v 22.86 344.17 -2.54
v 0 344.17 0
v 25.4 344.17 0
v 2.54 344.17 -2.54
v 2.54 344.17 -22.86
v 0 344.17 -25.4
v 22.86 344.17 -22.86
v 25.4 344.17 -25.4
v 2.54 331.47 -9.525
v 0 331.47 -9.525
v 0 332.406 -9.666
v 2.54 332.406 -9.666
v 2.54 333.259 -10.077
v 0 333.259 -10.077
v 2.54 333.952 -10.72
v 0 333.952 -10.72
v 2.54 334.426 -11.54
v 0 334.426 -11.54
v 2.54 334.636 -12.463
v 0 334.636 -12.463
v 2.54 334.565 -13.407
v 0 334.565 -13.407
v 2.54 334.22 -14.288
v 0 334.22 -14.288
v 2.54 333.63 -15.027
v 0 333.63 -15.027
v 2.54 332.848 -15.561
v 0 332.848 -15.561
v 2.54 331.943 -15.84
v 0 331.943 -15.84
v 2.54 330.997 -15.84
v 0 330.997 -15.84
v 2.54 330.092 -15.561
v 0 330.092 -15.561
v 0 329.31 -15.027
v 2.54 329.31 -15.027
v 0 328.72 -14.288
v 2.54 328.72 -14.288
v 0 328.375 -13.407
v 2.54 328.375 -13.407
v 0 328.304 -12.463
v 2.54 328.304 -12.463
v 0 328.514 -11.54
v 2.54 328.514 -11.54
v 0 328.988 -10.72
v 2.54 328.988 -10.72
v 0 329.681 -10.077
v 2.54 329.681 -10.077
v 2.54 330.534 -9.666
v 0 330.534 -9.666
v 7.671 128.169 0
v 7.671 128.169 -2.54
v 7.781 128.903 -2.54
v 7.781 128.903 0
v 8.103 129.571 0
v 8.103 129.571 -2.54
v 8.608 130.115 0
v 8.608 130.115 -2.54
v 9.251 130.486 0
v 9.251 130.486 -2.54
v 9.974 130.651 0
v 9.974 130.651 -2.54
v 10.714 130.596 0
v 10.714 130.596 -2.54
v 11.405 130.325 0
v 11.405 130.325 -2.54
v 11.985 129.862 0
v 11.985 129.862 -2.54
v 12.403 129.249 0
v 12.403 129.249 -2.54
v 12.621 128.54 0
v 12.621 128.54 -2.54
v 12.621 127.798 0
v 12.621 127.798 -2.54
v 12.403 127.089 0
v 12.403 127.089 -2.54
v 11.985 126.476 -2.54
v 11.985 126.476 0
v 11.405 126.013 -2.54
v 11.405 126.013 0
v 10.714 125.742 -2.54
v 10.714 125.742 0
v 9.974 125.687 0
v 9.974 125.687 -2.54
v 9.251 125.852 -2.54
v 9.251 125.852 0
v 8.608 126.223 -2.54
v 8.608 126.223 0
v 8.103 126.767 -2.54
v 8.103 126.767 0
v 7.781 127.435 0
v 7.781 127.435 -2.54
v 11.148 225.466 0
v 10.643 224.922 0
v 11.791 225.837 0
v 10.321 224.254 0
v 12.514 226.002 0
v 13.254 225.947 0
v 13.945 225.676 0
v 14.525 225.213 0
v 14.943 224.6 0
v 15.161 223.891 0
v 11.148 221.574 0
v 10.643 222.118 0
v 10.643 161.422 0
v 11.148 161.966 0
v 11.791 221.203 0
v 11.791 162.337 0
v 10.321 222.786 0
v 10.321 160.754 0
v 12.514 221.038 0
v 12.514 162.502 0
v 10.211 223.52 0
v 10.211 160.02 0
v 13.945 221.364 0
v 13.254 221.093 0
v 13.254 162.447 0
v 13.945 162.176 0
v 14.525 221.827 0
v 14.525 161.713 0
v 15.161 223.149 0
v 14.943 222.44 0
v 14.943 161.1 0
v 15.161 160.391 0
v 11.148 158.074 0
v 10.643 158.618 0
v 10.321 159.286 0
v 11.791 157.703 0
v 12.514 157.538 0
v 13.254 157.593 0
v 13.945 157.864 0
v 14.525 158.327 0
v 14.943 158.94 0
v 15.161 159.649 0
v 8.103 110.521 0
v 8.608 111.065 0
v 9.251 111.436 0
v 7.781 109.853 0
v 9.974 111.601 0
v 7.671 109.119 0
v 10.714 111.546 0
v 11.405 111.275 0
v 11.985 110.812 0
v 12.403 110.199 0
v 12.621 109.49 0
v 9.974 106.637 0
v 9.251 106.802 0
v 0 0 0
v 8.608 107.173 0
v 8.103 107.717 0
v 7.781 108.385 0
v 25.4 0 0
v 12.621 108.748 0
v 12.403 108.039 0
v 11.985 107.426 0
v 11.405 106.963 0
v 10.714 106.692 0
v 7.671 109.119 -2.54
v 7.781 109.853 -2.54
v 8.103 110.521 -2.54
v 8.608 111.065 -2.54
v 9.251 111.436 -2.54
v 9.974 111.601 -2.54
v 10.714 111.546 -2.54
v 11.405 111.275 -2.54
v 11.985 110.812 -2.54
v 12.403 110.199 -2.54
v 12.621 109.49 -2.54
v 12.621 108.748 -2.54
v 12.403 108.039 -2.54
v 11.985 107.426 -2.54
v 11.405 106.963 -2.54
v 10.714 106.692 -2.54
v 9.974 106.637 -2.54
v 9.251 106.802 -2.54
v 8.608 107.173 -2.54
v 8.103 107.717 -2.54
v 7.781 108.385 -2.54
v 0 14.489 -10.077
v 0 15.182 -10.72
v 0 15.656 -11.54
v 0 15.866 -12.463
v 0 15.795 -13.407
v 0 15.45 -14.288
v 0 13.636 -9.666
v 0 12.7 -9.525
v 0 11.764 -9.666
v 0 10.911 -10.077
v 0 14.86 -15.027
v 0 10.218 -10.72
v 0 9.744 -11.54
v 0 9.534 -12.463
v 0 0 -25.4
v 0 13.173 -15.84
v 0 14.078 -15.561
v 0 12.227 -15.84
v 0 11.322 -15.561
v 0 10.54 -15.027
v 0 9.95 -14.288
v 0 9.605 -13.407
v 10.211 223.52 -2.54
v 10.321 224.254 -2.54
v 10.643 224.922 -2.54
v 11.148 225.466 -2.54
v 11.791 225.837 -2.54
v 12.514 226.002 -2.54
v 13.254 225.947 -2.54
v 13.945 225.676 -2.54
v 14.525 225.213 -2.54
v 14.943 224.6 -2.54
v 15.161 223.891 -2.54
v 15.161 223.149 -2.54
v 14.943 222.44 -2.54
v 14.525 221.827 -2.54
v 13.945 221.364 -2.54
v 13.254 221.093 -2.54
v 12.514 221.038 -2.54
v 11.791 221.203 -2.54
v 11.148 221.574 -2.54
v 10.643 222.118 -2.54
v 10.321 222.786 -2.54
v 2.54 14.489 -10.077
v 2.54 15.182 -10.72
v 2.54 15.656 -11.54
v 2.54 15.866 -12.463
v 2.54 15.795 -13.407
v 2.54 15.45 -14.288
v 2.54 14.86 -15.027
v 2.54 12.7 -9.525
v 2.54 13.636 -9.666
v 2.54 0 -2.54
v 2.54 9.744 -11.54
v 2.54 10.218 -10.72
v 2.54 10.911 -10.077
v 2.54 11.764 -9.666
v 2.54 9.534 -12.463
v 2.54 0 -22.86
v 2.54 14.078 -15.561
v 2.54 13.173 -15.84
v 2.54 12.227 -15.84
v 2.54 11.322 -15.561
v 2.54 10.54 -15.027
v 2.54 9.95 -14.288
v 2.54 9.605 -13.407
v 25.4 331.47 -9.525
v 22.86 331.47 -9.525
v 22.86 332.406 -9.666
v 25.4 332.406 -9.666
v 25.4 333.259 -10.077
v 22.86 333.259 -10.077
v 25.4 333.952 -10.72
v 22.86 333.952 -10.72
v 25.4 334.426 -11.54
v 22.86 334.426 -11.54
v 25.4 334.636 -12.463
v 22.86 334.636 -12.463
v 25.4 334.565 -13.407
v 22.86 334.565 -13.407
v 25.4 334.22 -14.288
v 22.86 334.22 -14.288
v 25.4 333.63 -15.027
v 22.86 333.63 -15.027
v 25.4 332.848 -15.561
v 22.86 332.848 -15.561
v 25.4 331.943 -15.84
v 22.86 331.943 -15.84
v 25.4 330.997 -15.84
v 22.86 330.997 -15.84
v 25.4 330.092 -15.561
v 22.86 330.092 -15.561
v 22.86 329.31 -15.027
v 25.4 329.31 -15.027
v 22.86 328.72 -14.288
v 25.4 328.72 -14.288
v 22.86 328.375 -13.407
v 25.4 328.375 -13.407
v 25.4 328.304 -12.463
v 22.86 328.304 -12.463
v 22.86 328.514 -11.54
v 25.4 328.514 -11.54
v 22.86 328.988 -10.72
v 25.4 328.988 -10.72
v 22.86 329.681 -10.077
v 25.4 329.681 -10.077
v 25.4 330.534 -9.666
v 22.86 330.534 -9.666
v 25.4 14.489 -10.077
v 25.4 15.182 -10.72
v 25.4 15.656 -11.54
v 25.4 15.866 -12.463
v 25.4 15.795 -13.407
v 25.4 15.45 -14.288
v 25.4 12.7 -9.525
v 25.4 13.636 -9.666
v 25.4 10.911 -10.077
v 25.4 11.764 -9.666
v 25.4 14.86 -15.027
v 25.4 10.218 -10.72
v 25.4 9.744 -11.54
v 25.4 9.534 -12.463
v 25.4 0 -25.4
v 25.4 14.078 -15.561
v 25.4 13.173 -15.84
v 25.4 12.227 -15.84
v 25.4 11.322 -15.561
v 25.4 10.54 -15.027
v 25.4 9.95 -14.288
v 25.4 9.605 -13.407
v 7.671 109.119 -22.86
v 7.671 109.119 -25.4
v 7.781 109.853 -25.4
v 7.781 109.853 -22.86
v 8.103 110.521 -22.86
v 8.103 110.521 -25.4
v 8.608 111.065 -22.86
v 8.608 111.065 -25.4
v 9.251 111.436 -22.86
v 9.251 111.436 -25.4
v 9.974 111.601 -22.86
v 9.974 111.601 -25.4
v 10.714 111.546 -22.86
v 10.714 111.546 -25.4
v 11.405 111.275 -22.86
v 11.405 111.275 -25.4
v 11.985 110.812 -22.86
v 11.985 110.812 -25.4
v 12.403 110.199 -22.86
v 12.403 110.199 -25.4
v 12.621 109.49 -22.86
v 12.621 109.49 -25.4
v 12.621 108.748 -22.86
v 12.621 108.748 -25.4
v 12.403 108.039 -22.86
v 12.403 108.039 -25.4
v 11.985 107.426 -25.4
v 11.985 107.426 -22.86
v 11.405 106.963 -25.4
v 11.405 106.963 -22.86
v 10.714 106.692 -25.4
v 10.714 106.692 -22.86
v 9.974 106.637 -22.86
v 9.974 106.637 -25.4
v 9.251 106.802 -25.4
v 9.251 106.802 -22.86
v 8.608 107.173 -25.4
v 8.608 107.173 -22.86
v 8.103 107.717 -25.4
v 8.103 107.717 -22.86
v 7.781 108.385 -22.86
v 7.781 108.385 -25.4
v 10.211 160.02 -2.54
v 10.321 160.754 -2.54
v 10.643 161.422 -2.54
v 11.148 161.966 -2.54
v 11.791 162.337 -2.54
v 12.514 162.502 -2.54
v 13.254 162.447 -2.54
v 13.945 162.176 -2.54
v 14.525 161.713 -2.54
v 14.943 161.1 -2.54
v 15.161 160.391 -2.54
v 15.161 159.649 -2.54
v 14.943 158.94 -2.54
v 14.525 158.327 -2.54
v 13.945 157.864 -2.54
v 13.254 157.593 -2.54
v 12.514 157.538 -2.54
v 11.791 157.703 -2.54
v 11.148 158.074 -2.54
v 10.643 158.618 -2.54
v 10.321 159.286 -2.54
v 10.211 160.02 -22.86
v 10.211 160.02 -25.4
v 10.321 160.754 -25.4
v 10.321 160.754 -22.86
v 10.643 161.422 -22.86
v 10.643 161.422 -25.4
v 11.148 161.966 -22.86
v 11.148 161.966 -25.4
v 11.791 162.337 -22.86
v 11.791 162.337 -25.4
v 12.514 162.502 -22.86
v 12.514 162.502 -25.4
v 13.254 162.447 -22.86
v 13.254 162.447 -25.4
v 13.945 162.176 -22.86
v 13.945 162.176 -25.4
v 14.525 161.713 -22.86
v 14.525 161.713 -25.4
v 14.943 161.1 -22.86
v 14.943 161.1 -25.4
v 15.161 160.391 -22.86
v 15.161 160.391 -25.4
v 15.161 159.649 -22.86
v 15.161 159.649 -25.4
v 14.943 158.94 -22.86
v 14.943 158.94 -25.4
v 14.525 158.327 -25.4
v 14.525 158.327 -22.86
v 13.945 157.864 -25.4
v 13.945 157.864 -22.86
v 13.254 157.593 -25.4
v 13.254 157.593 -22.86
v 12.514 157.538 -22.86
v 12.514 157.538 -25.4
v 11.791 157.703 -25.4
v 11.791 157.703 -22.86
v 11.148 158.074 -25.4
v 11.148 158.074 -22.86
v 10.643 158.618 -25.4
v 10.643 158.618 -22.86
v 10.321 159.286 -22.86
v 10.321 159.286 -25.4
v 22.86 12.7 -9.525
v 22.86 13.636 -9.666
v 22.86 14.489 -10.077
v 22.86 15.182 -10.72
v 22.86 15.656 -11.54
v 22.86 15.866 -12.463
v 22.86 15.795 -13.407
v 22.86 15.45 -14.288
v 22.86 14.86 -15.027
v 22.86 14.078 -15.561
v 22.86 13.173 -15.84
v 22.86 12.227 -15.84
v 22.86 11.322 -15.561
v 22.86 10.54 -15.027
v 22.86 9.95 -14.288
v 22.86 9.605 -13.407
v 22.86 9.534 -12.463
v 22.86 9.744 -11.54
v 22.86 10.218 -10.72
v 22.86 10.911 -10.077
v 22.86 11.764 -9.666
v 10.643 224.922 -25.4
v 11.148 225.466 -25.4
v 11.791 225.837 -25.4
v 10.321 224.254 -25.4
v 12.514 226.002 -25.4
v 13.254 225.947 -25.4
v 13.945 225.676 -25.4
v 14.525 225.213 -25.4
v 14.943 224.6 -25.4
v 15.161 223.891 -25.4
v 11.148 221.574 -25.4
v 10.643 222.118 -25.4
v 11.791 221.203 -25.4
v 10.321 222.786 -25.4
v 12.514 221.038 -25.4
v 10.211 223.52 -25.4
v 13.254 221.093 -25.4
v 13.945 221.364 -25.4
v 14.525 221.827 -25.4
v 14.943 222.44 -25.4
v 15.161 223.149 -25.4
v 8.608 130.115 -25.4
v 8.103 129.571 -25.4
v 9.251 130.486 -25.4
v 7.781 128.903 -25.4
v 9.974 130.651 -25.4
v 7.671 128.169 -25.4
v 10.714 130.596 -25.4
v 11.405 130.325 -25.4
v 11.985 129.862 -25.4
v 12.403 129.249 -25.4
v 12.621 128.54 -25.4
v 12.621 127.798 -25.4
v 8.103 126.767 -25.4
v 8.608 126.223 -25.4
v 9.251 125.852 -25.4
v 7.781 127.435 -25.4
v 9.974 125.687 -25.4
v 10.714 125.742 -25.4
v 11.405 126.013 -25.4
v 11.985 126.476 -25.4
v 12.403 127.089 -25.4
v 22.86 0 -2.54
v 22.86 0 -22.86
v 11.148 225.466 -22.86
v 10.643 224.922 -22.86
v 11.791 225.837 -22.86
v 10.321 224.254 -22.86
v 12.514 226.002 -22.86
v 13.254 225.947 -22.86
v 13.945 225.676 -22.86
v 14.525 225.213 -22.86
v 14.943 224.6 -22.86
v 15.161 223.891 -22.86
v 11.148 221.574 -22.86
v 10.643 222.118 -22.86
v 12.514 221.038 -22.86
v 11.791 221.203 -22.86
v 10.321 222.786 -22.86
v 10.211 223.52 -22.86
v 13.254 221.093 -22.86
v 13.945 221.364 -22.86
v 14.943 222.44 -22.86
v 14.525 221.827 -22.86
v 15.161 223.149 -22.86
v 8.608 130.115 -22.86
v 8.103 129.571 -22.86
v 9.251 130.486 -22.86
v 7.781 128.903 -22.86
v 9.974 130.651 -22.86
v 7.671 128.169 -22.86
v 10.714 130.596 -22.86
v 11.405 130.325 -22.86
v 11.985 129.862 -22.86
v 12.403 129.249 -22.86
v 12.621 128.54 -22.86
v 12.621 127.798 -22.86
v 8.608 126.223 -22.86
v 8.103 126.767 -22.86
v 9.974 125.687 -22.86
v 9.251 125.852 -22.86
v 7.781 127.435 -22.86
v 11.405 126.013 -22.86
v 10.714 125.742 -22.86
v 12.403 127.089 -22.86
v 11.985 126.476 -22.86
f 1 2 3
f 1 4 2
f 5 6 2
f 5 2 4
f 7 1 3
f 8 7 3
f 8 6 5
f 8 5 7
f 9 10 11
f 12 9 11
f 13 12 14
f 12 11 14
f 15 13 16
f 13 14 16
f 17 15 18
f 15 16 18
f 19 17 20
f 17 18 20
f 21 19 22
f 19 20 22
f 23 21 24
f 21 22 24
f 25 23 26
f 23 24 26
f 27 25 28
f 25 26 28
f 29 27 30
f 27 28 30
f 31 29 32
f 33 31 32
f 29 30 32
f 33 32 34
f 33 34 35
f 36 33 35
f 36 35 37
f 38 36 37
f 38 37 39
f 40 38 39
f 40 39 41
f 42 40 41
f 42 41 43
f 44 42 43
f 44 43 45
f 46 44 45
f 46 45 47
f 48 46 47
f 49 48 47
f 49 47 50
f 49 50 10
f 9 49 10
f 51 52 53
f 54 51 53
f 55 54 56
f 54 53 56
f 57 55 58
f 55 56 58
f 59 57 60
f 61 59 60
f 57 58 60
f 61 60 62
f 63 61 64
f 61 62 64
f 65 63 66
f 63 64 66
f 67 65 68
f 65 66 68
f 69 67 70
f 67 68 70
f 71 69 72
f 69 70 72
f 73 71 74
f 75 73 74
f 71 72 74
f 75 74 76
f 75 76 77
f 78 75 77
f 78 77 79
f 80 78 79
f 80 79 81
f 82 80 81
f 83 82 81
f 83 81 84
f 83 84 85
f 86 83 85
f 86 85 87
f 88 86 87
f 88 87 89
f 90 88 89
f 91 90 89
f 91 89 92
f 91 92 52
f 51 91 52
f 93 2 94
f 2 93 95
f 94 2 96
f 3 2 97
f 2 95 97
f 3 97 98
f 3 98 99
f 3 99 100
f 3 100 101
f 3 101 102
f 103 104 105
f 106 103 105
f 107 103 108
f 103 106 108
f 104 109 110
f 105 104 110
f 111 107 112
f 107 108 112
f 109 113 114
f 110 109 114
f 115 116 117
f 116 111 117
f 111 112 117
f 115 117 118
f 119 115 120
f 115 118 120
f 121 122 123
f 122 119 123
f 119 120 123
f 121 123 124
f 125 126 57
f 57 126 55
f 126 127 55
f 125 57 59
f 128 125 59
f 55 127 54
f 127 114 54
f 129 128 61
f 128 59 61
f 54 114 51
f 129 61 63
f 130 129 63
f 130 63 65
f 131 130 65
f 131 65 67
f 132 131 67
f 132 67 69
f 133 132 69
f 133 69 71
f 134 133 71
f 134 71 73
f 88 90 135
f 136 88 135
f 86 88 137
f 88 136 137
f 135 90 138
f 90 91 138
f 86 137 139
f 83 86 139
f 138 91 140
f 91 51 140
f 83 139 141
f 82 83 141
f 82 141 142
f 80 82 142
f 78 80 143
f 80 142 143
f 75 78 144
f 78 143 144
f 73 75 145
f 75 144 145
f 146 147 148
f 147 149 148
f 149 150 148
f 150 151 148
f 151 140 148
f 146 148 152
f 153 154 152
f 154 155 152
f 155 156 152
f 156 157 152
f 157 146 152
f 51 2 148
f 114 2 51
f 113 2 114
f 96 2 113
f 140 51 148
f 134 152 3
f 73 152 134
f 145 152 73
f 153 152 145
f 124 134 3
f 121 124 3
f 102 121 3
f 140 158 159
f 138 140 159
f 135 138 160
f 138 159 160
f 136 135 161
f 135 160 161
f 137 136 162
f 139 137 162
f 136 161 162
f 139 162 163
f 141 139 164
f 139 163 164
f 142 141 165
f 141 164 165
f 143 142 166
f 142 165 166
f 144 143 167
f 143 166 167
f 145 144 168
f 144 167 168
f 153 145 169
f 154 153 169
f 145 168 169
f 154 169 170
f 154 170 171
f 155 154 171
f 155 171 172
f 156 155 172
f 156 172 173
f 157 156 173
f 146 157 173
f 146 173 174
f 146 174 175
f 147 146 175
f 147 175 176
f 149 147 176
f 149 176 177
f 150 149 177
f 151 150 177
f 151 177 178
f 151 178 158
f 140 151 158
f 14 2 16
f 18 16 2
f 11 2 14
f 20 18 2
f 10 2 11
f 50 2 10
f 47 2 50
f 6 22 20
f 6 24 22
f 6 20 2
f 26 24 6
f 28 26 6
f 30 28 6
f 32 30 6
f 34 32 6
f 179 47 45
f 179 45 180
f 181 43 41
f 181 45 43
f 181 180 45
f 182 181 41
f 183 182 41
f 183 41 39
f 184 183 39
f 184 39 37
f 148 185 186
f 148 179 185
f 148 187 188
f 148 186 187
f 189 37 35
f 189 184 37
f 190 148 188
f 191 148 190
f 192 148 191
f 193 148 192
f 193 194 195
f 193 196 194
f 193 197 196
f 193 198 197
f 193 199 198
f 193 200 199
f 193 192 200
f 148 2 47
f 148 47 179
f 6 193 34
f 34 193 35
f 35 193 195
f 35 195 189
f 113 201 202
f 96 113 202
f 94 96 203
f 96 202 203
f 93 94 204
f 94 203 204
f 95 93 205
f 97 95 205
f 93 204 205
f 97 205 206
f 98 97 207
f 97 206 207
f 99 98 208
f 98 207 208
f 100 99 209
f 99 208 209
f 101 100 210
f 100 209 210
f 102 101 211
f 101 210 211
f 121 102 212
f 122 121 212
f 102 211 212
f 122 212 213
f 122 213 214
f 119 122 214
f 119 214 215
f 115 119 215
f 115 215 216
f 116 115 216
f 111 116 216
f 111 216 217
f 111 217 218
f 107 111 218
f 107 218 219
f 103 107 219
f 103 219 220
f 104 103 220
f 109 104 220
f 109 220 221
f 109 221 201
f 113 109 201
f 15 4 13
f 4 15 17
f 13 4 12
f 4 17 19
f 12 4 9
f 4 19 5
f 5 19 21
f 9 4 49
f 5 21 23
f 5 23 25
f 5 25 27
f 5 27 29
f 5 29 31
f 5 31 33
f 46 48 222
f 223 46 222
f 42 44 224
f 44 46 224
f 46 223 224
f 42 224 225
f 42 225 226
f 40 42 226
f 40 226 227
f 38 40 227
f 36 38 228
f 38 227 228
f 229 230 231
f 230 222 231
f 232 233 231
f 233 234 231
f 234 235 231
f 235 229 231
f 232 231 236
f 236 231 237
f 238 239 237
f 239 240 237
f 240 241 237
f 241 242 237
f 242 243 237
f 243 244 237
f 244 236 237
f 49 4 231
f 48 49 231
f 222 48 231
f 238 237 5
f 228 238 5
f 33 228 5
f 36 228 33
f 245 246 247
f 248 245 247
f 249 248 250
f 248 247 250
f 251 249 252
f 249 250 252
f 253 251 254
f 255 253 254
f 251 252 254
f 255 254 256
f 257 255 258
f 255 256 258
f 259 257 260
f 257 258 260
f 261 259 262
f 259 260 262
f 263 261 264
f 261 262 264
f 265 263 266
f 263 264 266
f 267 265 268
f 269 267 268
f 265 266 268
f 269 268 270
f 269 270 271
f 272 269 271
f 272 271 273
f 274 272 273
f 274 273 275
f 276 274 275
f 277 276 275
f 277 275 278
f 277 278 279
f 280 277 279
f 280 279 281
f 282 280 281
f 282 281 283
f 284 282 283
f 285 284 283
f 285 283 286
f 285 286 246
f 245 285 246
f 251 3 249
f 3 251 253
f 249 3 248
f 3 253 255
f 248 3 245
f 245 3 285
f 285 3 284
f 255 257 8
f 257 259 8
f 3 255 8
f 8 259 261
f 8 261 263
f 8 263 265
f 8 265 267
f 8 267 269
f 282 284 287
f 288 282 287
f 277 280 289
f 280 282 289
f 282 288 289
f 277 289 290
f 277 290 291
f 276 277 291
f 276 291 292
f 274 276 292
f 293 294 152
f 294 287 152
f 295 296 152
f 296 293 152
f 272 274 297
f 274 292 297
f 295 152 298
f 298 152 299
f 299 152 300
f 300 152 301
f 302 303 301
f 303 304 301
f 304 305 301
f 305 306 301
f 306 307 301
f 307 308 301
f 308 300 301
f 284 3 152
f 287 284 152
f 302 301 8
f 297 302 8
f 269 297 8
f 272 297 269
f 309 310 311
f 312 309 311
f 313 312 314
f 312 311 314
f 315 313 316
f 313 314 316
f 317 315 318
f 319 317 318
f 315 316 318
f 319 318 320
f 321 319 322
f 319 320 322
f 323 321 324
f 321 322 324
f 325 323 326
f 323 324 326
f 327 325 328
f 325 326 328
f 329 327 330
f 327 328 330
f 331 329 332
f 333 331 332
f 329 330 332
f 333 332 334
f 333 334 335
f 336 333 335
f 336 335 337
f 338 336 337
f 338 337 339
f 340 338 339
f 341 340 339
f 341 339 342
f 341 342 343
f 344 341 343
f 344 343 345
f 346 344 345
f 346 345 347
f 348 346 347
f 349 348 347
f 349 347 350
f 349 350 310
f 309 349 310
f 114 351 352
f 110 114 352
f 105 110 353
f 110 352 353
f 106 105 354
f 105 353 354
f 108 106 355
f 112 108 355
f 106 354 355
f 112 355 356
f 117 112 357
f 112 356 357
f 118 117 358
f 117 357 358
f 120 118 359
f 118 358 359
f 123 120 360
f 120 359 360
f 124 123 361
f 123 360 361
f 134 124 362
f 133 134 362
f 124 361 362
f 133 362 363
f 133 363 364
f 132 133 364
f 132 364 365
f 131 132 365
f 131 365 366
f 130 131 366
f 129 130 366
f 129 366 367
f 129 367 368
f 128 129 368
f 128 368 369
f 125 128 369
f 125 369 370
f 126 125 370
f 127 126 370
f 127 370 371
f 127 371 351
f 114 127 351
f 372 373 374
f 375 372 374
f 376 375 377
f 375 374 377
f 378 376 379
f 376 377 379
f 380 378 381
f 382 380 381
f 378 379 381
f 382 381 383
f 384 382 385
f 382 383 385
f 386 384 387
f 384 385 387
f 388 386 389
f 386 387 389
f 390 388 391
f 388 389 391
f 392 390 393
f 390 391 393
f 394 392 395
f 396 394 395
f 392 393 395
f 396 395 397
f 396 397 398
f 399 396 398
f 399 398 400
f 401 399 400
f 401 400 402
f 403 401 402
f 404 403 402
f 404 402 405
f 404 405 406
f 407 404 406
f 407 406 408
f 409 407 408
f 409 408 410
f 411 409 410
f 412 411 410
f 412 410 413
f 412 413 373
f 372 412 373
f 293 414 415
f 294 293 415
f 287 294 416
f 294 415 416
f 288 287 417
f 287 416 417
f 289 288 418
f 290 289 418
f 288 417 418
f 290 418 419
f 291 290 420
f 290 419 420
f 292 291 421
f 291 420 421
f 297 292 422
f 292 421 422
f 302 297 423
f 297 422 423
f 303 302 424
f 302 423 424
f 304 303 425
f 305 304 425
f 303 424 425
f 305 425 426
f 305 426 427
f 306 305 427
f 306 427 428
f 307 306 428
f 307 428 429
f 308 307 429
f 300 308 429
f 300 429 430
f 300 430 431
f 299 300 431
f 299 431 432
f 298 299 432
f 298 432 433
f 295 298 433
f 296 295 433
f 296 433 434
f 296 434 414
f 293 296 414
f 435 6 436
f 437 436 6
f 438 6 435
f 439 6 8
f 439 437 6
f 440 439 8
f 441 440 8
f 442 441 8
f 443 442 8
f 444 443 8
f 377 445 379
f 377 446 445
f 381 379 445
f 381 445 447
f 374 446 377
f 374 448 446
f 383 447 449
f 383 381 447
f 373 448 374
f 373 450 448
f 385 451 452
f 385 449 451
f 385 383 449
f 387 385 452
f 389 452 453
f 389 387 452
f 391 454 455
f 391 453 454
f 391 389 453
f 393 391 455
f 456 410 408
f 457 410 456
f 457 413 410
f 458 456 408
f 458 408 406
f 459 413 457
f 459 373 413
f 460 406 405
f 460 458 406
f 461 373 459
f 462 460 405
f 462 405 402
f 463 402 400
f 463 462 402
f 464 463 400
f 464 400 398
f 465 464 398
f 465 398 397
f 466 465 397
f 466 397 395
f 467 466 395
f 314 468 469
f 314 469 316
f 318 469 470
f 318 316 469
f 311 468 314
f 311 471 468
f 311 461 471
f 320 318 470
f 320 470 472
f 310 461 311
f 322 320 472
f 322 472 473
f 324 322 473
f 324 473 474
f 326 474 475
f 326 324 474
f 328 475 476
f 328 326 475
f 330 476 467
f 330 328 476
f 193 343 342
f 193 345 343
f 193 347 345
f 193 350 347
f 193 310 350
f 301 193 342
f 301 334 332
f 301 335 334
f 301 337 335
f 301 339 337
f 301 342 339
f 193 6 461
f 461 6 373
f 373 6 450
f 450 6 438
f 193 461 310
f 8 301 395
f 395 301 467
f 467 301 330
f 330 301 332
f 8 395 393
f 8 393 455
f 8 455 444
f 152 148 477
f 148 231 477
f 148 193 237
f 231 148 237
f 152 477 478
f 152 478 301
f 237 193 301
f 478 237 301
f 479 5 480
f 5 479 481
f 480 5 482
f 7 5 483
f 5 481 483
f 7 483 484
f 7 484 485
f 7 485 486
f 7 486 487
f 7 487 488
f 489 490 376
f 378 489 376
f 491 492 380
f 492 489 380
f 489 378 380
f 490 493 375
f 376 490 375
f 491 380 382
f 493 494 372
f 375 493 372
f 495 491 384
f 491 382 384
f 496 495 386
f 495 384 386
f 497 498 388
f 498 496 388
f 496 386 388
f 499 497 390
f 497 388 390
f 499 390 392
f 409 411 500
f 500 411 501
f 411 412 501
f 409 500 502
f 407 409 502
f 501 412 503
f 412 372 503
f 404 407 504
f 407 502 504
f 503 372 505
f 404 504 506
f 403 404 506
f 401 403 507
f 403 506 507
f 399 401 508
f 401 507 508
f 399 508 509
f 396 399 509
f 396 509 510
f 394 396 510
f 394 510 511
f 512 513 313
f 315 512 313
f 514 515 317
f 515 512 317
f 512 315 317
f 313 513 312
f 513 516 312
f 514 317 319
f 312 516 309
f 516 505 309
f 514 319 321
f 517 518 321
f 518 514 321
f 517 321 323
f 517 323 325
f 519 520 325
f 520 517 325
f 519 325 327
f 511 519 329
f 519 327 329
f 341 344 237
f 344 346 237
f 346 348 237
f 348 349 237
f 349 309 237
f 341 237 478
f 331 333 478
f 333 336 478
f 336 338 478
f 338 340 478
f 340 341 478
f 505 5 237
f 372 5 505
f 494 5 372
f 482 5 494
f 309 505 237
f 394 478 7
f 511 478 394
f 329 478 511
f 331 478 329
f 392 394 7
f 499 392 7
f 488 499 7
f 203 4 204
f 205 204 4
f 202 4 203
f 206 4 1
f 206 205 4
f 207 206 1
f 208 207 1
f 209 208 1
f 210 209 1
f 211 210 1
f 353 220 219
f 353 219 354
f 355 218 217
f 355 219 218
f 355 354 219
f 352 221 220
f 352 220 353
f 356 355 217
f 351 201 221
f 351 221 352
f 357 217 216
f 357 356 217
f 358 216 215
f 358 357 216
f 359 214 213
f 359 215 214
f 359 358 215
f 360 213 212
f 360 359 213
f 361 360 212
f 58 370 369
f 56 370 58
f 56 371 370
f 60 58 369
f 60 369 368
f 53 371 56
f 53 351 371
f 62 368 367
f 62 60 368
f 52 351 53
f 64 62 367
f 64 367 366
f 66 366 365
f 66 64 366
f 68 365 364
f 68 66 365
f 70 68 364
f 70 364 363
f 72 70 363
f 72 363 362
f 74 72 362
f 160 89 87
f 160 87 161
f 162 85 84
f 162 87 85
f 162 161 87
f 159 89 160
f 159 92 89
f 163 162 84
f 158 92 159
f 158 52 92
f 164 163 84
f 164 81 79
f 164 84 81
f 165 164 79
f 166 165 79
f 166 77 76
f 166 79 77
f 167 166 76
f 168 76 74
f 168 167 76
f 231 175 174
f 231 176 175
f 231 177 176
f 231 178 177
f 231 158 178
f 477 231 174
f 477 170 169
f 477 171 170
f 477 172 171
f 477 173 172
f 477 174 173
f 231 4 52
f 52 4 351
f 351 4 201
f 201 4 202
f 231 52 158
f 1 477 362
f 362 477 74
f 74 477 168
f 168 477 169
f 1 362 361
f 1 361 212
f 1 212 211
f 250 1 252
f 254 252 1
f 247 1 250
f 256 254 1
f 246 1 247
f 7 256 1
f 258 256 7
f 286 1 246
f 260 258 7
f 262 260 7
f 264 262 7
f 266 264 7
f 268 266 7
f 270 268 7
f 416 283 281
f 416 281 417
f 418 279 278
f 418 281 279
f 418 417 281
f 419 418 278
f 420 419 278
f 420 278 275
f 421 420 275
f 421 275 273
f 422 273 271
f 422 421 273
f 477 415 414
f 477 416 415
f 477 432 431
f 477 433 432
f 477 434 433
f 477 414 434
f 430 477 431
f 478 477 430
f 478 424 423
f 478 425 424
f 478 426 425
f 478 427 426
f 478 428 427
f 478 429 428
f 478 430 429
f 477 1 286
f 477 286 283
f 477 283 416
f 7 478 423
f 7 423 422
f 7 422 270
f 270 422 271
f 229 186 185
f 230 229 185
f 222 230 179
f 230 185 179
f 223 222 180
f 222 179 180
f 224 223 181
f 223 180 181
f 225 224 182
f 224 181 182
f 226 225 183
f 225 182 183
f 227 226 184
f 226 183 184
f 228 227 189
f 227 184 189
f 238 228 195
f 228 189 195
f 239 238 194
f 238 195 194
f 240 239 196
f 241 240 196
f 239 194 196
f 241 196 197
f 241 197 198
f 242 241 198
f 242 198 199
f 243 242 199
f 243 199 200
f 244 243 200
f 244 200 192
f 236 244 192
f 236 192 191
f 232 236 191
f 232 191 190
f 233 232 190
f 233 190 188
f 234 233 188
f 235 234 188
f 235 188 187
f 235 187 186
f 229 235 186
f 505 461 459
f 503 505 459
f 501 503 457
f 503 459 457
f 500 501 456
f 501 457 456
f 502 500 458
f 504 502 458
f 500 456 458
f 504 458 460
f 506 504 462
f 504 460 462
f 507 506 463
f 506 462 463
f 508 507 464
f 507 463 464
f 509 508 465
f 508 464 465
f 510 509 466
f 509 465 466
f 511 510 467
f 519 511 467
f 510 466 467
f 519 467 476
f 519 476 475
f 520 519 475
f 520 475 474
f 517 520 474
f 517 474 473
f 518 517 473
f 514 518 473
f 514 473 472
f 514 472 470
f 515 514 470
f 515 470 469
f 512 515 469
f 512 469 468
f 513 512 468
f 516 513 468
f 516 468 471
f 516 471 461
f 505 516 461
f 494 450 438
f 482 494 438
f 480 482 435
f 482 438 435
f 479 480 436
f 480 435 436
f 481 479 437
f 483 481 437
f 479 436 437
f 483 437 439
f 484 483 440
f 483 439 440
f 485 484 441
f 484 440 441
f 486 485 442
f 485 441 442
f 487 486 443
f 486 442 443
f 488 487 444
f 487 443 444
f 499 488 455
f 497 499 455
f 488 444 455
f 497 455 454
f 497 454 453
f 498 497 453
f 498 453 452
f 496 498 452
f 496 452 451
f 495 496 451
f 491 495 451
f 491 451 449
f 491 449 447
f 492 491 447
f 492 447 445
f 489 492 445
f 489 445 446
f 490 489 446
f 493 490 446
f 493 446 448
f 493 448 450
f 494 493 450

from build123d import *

# Parameters (mm, degrees)
SKETCH1_W           = 25.4
SKETCH1_H           = 25.4
SKETCH1_W_2         = 20.32
SKETCH1_H_2         = 20.32
EXTRUDE_THIN1_DEPTH = 344.17
SKETCH2_R           = 2.4892
CUT_EXTRUDE1_DEPTH  = 26.4
SKETCH4_R           = 3.175
CUT_EXTRUDE3_DEPTH  = 26.4


with BuildPart() as part:
    # Sketch1 → Extrude-Thin1 (new body)
    with BuildSketch(Plane(origin=(0, 0, 0), x_dir=(1, 0, 0), z_dir=(0, 1, 0))):
        with Locations((12.7, 12.7)):
            Rectangle(SKETCH1_W, SKETCH1_H)
        with Locations((12.7, 12.7)):
            Rectangle(SKETCH1_W_2, SKETCH1_H_2, mode=Mode.SUBTRACT)
    extrude(amount=EXTRUDE_THIN1_DEPTH)

    # Sketch2 → Cut-Extrude1 (cut, through all)
    with BuildSketch(Plane(origin=(0, 0, -25.4), x_dir=(-1, 0, 0), z_dir=(0, 0, -1))):
        with Locations((-10.16, 109.1191)):
            Circle(SKETCH2_R)
        with Locations((-10.16, 128.1691)):
            Circle(SKETCH2_R)
        with Locations((-12.7, 160.02)):
            Circle(SKETCH2_R)
        with Locations((-12.7, 223.52)):
            Circle(SKETCH2_R)
    extrude(amount=-CUT_EXTRUDE1_DEPTH, mode=Mode.SUBTRACT)

    # Sketch4 → Cut-Extrude3 (cut, through all)
    with BuildSketch(Plane.ZY):
        with Locations((-12.7, 12.7)):
            Circle(SKETCH4_R)
        with Locations((-12.7, 331.47)):
            Circle(SKETCH4_R)
    extrude(amount=-CUT_EXTRUDE3_DEPTH, mode=Mode.SUBTRACT)


solid = part.part
